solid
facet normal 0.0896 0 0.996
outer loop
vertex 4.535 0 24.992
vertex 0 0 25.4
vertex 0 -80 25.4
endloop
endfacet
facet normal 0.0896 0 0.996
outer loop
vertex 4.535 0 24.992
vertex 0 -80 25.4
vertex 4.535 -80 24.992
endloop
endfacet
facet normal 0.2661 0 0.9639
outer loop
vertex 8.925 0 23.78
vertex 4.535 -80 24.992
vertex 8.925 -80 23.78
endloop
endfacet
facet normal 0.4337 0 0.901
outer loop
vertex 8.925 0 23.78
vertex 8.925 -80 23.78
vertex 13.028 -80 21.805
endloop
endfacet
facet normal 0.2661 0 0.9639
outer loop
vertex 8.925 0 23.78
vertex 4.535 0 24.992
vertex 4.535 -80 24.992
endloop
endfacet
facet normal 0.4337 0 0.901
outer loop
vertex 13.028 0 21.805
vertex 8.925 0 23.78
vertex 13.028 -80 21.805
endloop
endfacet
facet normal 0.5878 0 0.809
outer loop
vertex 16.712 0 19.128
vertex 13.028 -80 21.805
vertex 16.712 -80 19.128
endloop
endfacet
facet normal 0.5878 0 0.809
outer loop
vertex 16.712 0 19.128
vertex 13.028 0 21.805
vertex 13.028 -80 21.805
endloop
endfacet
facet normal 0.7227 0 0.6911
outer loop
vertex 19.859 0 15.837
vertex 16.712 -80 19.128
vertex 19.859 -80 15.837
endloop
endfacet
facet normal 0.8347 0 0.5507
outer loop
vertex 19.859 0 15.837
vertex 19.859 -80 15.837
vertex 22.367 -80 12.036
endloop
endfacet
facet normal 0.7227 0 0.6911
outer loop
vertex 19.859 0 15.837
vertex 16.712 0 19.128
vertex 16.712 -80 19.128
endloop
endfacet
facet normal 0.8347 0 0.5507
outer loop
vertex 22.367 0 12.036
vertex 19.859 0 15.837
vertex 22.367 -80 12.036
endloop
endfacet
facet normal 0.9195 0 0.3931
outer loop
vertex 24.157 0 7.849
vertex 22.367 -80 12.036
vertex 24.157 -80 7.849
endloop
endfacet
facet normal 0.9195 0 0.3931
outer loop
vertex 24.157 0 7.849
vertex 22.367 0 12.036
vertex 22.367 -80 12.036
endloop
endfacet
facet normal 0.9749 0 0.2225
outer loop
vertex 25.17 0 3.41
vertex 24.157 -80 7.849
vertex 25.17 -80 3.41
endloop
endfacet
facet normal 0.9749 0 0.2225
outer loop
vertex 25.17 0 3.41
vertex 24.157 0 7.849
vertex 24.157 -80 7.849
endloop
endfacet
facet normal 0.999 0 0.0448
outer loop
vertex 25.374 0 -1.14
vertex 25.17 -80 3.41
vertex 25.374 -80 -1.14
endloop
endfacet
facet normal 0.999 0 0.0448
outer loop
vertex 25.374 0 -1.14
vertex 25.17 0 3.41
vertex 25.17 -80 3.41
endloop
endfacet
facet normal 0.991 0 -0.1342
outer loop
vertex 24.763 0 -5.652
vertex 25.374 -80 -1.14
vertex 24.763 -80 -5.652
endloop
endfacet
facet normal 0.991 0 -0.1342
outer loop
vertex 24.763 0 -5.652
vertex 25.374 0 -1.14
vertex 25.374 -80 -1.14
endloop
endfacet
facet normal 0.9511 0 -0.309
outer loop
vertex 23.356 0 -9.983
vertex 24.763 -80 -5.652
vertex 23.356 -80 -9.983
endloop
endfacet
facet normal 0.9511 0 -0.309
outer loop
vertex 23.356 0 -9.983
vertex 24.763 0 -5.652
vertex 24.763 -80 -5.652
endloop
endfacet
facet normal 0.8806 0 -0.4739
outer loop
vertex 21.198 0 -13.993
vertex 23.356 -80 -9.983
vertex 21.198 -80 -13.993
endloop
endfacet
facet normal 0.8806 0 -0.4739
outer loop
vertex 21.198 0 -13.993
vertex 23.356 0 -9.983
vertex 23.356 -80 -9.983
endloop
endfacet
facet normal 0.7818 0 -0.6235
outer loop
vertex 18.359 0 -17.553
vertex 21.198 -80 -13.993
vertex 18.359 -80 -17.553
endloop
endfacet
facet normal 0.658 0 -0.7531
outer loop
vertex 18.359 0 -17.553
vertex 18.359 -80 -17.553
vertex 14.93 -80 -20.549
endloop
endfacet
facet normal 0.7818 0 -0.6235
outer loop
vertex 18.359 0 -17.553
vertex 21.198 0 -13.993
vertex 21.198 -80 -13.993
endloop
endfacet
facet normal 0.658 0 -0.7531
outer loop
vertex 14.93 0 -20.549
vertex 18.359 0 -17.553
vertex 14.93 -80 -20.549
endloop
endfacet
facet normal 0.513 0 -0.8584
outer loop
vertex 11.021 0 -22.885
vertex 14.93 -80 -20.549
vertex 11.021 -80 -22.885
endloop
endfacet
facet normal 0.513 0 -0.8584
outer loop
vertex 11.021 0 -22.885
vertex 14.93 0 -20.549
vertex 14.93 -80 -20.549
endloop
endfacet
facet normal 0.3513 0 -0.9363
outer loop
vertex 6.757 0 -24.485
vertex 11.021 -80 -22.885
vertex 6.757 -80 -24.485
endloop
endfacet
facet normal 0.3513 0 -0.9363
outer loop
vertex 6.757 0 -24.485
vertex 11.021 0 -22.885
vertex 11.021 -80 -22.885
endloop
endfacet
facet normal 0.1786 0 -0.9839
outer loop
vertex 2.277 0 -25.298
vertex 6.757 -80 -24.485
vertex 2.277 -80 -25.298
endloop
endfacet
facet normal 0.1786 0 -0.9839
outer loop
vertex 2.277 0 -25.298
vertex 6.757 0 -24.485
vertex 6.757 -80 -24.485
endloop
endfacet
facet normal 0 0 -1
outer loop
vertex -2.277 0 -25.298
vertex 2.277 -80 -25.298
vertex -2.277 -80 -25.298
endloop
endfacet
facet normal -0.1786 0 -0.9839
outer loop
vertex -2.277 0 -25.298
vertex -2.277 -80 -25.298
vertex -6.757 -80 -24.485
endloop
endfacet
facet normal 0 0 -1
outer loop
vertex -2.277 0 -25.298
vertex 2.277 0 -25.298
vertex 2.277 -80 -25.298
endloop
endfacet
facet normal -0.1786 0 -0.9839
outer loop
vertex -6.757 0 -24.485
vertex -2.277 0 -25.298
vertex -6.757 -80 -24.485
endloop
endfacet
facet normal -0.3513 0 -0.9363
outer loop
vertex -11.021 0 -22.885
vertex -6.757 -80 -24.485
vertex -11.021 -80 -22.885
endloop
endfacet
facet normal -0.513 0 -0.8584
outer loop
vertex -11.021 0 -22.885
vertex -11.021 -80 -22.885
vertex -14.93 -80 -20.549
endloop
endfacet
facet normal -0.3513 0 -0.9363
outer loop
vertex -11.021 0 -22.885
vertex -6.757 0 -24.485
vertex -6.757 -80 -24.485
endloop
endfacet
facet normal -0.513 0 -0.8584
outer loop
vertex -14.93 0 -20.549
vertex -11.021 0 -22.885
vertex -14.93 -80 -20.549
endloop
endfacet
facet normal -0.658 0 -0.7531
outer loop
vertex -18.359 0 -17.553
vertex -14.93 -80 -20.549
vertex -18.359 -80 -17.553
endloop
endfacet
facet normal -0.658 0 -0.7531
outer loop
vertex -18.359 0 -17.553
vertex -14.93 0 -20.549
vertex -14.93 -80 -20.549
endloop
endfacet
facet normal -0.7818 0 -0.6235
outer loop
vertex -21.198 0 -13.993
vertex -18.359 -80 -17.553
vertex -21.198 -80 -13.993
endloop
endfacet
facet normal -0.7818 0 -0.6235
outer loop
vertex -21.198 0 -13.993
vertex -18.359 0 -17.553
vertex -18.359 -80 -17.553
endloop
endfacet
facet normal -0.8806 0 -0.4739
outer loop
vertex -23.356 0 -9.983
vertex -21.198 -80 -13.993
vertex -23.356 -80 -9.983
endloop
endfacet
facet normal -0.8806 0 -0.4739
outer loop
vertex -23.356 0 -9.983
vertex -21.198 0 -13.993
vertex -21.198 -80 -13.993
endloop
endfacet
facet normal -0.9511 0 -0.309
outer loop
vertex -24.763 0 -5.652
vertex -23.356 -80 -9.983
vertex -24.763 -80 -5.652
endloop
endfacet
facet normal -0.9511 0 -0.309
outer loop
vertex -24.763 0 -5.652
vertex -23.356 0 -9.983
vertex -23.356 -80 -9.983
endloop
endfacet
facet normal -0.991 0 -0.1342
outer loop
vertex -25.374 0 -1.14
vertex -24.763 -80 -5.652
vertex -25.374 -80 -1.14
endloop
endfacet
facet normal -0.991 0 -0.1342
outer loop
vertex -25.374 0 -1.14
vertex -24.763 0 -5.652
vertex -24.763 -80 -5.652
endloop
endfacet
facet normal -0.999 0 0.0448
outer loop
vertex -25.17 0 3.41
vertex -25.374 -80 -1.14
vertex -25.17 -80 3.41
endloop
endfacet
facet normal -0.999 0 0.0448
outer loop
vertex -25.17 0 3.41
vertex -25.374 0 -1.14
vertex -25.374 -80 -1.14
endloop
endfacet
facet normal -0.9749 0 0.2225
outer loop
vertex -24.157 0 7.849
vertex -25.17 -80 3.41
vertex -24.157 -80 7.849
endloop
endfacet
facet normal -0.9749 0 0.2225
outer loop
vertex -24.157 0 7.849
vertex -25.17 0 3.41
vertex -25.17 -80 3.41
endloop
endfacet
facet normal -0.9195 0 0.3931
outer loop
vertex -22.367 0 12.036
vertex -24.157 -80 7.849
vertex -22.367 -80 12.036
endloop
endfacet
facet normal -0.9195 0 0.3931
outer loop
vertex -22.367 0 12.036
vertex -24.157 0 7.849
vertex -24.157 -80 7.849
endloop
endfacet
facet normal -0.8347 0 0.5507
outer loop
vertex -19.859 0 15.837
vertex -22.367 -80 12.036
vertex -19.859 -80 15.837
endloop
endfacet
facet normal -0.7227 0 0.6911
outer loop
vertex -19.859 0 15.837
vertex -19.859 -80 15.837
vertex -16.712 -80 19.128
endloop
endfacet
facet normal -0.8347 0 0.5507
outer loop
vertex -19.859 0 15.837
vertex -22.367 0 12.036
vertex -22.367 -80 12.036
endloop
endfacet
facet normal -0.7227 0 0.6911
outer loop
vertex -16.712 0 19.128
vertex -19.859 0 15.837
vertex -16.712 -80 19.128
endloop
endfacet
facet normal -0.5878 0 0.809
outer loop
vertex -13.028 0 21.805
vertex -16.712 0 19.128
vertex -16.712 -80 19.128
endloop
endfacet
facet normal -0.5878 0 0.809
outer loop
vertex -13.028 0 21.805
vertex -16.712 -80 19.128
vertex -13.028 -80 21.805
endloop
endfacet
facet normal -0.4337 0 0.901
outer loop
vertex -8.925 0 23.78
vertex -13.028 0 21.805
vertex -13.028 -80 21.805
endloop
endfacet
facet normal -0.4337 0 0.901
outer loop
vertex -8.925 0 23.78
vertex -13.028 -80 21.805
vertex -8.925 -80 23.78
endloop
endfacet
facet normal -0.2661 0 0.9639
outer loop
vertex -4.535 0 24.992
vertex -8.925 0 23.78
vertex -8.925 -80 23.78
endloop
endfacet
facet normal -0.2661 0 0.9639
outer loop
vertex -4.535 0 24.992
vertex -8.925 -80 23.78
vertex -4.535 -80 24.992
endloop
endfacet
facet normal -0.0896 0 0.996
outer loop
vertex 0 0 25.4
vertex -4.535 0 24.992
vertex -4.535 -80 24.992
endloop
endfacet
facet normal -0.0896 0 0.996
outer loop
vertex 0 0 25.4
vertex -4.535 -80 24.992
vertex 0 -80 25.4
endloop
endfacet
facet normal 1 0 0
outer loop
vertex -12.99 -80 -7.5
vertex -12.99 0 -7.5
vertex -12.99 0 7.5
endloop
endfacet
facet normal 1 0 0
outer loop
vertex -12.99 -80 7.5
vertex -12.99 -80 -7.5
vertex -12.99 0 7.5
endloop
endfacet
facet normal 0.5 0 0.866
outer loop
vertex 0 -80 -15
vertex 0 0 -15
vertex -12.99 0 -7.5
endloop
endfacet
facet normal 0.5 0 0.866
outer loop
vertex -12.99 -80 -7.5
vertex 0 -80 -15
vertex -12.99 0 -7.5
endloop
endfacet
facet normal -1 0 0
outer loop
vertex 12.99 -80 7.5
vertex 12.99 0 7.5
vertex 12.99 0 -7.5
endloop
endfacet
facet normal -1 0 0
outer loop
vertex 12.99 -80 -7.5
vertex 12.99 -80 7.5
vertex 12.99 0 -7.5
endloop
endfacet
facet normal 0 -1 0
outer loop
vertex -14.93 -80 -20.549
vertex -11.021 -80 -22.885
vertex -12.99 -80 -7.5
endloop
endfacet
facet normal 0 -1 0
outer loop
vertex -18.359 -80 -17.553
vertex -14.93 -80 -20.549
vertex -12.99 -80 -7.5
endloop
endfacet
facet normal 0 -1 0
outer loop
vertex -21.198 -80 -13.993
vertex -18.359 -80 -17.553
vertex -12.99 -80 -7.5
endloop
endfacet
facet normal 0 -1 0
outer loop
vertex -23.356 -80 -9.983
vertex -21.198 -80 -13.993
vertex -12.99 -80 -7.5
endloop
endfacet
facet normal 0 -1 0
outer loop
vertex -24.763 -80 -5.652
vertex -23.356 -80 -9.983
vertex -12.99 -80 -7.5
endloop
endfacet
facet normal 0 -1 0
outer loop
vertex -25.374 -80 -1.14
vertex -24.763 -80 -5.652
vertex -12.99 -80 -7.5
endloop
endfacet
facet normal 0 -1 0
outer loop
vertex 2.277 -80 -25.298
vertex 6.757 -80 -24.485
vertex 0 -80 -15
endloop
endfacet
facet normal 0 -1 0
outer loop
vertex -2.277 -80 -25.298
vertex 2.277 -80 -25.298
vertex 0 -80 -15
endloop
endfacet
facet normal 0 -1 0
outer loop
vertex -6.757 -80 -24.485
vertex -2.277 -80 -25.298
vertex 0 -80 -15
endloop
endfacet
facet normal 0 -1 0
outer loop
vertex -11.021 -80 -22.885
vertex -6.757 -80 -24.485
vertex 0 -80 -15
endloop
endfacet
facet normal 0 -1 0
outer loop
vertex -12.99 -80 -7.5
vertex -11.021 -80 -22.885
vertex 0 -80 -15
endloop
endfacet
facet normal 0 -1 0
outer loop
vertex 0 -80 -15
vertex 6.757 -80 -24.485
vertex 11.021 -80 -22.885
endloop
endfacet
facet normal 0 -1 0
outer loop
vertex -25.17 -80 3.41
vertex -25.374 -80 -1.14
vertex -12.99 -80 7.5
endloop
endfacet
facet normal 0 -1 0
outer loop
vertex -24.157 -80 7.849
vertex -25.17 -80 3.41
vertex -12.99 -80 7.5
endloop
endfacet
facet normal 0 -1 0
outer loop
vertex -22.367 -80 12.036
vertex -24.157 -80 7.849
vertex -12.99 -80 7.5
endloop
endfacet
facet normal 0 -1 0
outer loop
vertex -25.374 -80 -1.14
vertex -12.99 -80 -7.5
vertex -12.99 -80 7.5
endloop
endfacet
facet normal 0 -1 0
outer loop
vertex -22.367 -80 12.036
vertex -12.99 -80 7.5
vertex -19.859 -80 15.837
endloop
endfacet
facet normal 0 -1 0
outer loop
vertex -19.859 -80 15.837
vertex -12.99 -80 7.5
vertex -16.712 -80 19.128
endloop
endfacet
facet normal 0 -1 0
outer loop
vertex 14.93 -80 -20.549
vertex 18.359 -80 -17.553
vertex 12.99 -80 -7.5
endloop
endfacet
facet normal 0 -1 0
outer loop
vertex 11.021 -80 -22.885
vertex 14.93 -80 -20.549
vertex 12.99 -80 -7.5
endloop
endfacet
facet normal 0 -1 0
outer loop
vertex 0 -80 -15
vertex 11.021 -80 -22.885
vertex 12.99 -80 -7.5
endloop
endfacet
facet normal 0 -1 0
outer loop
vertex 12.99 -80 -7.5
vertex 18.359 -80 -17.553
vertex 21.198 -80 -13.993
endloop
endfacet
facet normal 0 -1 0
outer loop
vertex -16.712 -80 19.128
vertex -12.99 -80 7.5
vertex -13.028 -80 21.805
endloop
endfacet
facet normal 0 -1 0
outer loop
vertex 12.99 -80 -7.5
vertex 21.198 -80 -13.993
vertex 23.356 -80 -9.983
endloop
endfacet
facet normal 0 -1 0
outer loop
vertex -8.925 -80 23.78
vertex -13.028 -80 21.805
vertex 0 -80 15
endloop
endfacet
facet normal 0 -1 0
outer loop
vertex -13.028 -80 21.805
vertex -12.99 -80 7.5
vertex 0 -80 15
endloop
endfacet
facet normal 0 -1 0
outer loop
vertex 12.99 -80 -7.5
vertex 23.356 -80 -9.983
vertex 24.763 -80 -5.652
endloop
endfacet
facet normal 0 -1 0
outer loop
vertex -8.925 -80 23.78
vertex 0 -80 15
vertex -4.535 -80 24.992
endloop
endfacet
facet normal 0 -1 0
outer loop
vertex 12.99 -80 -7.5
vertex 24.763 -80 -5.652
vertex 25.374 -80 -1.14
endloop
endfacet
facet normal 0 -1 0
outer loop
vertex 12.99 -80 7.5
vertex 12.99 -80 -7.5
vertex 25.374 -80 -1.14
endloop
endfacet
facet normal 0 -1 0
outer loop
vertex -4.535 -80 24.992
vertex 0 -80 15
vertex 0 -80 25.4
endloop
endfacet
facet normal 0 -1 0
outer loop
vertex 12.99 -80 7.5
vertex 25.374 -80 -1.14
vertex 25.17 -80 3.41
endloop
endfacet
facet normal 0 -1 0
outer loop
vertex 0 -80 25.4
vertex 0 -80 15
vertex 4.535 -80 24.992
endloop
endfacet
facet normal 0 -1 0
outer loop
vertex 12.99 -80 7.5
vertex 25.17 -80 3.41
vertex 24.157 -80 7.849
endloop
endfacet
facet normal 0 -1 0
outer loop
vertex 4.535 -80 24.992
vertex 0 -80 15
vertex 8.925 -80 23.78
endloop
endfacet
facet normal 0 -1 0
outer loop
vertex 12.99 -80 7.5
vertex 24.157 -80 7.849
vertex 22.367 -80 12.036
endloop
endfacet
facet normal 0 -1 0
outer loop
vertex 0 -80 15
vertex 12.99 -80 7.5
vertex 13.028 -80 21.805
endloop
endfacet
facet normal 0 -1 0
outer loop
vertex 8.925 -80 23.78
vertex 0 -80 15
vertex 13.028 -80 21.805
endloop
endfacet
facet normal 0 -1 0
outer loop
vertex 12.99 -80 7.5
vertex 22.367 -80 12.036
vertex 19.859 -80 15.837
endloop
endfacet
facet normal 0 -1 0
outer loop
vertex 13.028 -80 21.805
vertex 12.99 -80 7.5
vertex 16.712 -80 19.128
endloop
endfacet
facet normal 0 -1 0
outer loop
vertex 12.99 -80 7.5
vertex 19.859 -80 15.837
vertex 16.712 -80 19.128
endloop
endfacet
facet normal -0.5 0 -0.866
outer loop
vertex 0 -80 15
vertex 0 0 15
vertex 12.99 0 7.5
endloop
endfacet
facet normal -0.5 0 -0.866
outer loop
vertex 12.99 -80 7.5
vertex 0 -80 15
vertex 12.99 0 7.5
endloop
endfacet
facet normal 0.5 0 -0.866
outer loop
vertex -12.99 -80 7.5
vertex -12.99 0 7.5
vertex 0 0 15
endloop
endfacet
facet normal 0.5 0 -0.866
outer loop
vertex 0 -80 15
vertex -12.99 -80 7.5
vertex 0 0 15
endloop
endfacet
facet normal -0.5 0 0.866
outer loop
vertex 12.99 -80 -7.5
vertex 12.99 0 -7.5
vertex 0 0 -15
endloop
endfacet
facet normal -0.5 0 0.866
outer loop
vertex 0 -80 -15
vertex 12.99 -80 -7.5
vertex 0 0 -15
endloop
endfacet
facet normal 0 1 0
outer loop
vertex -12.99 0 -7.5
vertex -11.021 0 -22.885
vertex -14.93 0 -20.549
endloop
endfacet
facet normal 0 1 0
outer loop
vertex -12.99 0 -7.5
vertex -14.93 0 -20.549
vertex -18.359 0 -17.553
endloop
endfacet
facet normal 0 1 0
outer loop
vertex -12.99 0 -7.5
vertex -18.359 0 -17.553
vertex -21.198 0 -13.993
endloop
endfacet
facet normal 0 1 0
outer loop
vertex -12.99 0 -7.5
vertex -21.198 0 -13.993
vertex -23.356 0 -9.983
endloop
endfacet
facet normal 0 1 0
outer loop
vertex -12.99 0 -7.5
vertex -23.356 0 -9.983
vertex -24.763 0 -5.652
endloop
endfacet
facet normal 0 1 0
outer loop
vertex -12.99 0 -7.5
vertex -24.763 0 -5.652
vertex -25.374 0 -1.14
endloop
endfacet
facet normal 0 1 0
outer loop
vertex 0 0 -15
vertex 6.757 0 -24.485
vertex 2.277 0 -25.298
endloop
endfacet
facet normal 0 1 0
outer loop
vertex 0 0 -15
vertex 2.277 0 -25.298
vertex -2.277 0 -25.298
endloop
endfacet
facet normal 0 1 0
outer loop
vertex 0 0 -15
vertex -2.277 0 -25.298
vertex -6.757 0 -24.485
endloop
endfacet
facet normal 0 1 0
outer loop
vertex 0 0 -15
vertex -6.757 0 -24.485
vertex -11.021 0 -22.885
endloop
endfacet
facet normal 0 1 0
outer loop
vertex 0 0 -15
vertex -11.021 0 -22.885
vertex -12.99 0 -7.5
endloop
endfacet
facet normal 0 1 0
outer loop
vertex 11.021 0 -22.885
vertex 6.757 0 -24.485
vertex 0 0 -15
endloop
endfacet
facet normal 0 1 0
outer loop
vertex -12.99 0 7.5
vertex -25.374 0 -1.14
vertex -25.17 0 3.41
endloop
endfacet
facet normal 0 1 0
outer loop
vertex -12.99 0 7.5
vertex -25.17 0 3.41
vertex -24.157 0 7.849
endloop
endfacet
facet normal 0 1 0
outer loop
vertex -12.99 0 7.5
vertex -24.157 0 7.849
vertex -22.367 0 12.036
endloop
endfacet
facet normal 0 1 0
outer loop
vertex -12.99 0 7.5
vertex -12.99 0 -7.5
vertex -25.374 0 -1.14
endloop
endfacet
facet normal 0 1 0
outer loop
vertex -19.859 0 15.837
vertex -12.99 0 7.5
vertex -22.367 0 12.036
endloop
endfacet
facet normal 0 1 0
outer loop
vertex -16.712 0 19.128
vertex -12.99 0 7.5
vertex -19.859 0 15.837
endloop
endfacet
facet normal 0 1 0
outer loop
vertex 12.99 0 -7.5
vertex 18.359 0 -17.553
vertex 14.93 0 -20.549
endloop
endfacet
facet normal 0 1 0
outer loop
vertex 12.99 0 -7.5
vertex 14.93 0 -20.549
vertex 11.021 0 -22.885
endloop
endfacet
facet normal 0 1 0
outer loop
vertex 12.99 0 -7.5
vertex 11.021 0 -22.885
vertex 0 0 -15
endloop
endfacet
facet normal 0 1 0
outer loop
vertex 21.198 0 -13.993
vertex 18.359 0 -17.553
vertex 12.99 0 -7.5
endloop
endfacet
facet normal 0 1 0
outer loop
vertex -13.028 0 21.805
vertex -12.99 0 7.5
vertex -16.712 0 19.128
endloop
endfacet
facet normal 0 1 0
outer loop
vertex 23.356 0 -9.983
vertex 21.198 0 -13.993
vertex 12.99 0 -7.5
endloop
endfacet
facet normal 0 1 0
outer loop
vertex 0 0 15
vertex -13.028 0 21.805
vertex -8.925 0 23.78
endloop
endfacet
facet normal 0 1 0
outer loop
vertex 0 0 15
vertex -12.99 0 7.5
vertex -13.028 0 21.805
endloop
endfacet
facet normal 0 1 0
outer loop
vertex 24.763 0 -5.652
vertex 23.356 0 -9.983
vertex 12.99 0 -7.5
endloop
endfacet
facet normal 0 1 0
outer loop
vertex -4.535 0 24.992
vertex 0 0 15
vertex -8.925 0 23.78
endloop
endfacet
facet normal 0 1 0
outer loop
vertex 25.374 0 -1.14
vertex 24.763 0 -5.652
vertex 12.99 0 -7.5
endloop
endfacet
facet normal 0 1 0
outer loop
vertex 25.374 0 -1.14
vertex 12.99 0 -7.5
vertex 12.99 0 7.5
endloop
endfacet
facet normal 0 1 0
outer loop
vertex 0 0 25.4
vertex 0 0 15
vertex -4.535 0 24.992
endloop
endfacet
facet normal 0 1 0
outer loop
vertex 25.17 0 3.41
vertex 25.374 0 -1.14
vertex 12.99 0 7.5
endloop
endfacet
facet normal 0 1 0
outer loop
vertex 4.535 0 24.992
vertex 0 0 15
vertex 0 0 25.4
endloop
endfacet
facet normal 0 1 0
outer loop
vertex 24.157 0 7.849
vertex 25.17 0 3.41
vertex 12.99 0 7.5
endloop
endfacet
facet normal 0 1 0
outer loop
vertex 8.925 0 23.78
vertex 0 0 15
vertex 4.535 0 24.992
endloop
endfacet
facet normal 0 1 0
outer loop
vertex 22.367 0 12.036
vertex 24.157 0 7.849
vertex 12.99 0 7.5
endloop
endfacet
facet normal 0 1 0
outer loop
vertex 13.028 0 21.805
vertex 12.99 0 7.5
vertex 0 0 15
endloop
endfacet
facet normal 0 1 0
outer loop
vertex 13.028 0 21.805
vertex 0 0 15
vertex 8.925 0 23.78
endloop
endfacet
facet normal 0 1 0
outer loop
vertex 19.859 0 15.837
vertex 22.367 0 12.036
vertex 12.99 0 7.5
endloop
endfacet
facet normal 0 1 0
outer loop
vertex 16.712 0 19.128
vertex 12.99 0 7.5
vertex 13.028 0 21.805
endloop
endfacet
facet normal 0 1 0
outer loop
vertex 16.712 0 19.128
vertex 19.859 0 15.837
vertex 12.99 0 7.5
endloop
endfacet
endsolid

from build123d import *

# Parameters (mm, degrees)
SKETCH1_R           = 25.4
BOSS_EXTRUDE1_DEPTH = 80


with BuildPart() as part:
    # Sketch1 → Boss-Extrude1 (new body)
    with BuildSketch(Plane(origin=(0, 0, 0), x_dir=(1, 0, 0), z_dir=(0, 1, 0))):
        with Locations(Location((0, 0, 0), (0, 0, 270))):
            Circle(SKETCH1_R)
        Polygon((12.990381057, 7.5), (0, 15), (-12.990381057, 7.5), (-12.990381057, -7.5), (0, -15), (12.990381057, -7.5), align=None, mode=Mode.SUBTRACT)
    extrude(amount=-BOSS_EXTRUDE1_DEPTH)


solid = part.part
